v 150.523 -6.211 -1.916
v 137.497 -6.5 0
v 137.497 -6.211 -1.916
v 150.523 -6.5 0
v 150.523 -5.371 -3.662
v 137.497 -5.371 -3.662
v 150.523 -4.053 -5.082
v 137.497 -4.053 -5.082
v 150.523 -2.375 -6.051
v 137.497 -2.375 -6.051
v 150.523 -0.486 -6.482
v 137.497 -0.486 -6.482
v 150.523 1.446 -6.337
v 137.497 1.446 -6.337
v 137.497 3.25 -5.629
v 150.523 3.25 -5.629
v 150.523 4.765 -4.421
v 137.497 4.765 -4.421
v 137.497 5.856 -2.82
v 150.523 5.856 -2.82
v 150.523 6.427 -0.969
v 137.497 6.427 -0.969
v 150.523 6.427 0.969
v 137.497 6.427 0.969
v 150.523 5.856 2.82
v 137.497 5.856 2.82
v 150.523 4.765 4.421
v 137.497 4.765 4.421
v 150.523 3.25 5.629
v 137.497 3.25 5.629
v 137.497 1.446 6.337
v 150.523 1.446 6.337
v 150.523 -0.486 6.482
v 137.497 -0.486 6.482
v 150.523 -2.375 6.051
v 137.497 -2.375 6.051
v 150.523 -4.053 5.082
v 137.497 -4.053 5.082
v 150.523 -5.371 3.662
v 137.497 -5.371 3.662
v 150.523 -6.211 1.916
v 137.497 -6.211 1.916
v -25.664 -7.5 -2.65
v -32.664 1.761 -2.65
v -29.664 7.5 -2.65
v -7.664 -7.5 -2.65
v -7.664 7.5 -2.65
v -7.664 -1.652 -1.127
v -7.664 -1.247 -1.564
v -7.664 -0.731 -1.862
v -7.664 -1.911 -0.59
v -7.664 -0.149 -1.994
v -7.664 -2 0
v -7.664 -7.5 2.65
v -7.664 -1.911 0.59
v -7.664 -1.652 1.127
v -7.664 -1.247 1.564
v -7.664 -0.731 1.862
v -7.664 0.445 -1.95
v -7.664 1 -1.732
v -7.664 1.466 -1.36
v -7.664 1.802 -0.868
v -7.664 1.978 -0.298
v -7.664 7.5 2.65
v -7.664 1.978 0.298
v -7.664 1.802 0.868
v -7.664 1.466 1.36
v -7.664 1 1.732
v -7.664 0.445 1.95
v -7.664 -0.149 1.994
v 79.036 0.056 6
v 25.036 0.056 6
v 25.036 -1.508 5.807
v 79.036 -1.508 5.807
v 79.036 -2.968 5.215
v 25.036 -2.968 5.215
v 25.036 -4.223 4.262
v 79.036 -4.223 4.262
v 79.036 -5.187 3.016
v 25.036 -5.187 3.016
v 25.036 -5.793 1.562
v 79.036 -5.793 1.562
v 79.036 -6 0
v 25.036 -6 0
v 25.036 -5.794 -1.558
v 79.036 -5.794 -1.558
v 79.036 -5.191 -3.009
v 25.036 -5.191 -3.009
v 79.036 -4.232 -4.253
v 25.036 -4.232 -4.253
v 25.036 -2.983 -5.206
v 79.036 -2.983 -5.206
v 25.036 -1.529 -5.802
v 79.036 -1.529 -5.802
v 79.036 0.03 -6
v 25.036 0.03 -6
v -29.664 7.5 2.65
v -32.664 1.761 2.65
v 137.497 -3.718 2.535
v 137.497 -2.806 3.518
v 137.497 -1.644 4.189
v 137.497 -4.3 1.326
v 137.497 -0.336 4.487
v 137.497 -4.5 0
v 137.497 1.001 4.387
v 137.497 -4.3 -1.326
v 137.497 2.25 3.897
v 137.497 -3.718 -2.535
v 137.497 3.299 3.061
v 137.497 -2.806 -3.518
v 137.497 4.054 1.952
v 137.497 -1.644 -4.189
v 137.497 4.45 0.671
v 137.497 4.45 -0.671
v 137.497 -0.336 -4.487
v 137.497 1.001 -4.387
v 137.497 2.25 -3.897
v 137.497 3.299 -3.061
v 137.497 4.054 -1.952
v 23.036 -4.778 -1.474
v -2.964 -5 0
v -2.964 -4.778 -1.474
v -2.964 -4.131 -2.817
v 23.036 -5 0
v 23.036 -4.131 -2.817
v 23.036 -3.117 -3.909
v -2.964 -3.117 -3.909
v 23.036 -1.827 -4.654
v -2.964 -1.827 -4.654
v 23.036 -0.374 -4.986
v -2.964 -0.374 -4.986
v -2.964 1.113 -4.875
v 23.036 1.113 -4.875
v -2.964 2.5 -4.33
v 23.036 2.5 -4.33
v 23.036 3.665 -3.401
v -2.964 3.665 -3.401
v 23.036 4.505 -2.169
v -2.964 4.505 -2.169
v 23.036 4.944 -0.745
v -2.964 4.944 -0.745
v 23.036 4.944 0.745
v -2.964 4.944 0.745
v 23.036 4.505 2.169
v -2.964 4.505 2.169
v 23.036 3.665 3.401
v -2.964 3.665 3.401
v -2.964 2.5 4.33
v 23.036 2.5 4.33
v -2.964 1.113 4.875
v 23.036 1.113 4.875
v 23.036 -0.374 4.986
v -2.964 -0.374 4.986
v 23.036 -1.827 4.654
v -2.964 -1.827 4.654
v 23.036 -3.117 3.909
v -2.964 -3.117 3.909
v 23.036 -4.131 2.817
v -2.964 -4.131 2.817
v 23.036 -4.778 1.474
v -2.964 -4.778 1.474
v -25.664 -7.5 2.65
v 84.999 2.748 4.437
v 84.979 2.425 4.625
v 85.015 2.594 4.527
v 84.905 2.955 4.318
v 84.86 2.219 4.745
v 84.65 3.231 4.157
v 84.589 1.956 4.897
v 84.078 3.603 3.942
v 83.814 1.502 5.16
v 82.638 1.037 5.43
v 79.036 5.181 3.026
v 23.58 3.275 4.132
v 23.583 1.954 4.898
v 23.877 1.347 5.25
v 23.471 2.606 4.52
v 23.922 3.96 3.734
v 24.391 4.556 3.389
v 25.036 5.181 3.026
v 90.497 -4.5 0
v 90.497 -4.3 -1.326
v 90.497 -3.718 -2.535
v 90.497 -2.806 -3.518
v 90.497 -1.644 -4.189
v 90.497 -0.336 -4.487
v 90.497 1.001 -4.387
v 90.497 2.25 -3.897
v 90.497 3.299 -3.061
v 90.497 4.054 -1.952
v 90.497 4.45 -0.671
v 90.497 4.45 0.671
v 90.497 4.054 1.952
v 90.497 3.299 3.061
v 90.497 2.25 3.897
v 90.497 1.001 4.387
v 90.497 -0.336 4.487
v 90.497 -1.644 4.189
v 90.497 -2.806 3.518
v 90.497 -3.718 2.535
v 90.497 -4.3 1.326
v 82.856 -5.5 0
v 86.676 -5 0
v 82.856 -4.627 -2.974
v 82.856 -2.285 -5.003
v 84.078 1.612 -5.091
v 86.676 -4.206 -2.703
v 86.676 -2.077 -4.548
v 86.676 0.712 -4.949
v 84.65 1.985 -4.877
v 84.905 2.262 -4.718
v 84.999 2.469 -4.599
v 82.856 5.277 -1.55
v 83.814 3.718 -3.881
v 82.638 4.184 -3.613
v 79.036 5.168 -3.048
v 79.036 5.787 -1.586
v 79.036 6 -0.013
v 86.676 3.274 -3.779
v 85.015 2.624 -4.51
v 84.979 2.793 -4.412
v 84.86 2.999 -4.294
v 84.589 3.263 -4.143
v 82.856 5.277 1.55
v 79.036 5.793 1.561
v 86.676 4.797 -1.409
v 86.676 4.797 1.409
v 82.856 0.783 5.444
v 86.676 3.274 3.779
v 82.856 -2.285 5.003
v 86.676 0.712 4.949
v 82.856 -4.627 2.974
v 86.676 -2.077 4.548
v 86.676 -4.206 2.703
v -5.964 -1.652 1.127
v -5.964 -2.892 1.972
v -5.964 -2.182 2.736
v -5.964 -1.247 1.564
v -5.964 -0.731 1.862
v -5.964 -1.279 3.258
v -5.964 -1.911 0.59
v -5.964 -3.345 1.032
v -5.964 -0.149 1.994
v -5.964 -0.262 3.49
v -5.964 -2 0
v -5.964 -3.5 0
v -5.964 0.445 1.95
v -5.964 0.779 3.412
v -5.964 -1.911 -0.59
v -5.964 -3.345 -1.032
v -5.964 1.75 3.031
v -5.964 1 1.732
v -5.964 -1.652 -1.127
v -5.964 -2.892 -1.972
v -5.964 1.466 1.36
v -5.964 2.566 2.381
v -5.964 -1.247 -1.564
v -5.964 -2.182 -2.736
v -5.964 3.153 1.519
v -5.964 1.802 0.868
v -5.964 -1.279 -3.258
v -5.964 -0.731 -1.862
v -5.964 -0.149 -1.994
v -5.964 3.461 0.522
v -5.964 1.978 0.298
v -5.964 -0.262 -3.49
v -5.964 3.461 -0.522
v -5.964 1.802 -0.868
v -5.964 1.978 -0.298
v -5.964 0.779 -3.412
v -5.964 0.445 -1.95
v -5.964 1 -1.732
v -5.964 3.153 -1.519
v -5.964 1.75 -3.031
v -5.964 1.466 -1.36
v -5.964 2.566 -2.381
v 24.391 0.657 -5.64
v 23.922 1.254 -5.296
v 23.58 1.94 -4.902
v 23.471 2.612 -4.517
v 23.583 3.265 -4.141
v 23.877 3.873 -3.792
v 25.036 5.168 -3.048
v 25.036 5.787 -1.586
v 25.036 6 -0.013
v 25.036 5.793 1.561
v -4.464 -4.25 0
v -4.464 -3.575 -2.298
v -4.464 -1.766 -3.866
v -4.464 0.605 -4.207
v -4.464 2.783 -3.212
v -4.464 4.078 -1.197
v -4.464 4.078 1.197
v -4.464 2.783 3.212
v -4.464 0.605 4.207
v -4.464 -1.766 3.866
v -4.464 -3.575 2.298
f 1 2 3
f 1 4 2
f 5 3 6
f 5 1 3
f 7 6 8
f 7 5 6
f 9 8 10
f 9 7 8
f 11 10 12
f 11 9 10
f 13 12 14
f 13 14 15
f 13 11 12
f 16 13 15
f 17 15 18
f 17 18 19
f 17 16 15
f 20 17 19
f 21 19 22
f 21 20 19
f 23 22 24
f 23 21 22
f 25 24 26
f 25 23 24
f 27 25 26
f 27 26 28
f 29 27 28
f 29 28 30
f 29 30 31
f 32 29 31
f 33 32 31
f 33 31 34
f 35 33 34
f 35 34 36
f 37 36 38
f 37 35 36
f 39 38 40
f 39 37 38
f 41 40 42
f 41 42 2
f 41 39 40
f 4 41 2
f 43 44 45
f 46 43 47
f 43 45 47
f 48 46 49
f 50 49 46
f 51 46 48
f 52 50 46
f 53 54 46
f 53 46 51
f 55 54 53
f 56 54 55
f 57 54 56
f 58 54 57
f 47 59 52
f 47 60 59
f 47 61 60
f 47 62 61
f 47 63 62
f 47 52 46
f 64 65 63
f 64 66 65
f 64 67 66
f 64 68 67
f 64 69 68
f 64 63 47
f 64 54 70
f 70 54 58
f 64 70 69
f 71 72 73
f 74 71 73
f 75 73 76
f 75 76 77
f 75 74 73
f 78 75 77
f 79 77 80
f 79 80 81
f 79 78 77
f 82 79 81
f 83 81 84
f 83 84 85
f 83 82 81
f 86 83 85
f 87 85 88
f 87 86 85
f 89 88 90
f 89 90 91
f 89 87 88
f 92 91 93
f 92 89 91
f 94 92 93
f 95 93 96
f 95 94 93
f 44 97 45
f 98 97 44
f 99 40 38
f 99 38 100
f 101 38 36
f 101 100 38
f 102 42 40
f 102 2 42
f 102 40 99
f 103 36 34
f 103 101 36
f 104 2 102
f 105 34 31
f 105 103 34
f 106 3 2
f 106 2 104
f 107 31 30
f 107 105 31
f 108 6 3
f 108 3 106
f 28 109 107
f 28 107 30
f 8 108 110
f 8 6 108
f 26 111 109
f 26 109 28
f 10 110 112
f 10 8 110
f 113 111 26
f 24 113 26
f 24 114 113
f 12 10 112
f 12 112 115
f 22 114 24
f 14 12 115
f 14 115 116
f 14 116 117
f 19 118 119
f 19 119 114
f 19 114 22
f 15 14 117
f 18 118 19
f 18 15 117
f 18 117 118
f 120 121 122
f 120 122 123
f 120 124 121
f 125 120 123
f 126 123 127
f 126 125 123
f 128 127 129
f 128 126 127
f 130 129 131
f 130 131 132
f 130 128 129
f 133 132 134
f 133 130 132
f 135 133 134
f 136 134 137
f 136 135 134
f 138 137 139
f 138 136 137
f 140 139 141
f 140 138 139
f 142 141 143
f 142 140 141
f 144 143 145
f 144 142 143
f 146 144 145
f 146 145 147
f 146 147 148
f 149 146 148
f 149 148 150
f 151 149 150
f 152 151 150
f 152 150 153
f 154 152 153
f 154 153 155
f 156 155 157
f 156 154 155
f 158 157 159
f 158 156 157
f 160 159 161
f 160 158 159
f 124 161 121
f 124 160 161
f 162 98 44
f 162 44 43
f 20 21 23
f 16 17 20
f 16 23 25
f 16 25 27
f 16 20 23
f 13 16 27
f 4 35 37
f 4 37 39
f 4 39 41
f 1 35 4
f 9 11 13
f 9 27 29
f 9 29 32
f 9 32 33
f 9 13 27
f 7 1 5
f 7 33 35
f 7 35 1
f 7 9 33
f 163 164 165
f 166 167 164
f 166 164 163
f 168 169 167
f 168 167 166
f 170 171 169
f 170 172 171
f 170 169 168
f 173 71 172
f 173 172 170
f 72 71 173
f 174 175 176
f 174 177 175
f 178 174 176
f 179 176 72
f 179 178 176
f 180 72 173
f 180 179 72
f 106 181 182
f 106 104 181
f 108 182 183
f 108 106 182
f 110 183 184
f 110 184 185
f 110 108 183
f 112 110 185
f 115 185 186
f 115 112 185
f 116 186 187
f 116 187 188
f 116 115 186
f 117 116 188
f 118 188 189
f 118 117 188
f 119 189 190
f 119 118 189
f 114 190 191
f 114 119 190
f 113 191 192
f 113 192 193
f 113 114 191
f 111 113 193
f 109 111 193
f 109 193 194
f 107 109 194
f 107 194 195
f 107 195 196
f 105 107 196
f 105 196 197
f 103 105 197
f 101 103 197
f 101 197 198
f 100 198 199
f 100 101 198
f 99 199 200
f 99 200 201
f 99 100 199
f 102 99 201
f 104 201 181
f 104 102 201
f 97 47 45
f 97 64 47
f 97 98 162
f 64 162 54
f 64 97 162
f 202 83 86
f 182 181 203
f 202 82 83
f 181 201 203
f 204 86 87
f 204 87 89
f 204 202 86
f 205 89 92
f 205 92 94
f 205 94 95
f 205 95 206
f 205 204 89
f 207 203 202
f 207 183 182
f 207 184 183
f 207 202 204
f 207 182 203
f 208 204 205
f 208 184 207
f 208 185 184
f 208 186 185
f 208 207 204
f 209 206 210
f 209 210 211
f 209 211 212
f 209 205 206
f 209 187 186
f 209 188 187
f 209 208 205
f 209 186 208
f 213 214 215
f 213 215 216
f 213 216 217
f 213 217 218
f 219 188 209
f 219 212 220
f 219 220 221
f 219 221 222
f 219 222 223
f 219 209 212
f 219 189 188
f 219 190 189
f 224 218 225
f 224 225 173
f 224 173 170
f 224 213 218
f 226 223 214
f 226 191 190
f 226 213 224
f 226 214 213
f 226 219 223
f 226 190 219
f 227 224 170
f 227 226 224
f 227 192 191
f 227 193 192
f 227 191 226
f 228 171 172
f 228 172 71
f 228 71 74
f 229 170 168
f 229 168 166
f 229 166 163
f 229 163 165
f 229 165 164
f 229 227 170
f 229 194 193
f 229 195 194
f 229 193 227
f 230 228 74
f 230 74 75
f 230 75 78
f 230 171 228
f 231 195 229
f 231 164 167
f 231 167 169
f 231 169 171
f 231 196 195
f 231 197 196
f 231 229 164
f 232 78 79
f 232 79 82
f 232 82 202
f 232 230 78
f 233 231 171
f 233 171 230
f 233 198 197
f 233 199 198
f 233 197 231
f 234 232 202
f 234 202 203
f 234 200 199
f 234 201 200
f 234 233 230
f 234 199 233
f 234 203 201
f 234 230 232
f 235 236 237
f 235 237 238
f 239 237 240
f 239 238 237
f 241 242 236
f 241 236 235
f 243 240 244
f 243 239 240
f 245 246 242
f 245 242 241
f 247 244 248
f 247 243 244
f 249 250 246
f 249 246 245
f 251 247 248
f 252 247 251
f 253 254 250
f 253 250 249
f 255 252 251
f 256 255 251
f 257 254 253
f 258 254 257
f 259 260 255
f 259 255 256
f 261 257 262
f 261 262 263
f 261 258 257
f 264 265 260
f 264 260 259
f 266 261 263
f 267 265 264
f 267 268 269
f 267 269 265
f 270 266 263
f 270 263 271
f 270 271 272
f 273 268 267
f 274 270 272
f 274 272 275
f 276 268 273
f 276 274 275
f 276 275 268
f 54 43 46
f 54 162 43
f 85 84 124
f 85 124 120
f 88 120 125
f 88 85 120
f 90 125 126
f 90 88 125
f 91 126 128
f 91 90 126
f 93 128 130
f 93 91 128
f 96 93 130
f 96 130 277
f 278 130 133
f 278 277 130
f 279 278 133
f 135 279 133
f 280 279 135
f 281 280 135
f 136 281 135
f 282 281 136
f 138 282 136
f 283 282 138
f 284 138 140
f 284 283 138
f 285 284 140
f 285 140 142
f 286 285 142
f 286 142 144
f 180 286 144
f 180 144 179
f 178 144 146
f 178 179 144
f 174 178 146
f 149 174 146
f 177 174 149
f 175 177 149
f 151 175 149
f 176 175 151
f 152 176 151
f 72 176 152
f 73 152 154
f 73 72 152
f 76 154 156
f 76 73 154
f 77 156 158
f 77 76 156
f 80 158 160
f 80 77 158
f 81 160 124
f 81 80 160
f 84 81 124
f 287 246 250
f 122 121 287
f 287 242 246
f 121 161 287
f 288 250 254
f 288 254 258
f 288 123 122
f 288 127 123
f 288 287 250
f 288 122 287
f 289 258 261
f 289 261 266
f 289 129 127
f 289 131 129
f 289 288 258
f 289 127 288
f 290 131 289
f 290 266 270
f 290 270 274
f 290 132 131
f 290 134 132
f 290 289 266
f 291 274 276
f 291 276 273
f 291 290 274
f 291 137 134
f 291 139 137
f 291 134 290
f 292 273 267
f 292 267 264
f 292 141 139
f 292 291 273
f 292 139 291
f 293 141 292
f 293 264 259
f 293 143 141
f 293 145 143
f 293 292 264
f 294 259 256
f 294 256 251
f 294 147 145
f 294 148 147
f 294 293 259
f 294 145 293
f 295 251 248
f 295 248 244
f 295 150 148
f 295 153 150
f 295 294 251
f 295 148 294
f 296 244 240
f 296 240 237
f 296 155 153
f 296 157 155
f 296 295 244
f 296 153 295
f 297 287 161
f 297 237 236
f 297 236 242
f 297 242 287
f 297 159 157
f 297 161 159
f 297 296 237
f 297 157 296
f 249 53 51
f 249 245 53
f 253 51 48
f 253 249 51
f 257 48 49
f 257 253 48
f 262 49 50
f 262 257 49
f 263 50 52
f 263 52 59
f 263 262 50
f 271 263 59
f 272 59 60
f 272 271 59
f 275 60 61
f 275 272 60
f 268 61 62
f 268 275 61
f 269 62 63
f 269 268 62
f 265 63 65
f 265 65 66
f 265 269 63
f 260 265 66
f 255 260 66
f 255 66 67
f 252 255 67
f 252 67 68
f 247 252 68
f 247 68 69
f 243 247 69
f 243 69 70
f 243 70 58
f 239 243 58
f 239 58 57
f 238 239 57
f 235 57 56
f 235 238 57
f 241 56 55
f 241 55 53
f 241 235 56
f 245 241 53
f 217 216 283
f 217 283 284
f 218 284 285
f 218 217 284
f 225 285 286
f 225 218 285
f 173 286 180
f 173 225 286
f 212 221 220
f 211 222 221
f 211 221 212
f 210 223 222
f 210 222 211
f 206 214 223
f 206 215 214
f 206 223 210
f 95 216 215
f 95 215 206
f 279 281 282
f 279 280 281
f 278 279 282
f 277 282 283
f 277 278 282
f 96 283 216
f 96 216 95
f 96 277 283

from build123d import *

# Parameters (mm, degrees)
F0_W     = 1.7
F0_H     = 2
F0_W_2   = 26
F0_H_2   = 5
F0_W_3   = 54
F0_H_3   = 6
F0_W_4   = 47
F0_H_4   = 4.5
F2_DEPTH = 2.65
F4_DEPTH = 97.7


with BuildPart() as f1:
    # F0 (on Top) → F1 (revolve)
    with BuildSketch(Plane.XY):
        with Locations((-6.814198, -1)):
            Rectangle(F0_W, F0_H)
        with Locations((10.035802, -2.5)):
            Rectangle(F0_W_2, F0_H_2)
        Polygon((25.035802, 0), (23.035802, 0), (23.035802, -5), (25.035802, -6), align=None)
        with Locations((52.035802, -3)):
            Rectangle(F0_W_3, F0_H_3)
        Polygon((90.496607, 0), (79.035802, 0), (79.035802, -6), (90.496607, -4.5), align=None)
        with Locations((113.996607, -2.25)):
            Rectangle(F0_W_4, F0_H_4)
        Polygon((150.523409, 0), (137.496607, 0), (137.496607, -4.5), (137.496607, -6.5), (150.523409, -6.5), align=None)
        Polygon((-2.964198, 0), (-5.964198, 0), (-5.964198, -2), (-5.964198, -3.5), (-2.964198, -5), align=None)
    revolve(axis=Axis((44.526573, 0, 0), (1, 0, 0)))

    # F0 (on Top) → F2 (join, symmetric)
    with BuildSketch(Plane.XY):
        Polygon((-7.664198, 7.5), (-29.664198, 7.5), (-32.664198, 1.760973), (-25.664198, -7.5), (-7.664198, -7.5), (-7.664198, -2), (-7.664198, 0), align=None)
    extrude(amount=F2_DEPTH, both=True)

    # F3 (on Right) → F4 (cut)
    with BuildSketch(Plane.YZ):
        Polygon((0.013024, 7.701685), (0.013024, 6.024447), (5.223836, 3.000944), (8.659112, 3.000944), (8.659112, -3.023503), (5.210811, -3.023503), (-0.013024, -6.024447), (0.013024, -7.905965), (11.633459, -7.905965), (11.633459, 7.701685), align=None)
    extrude(amount=F4_DEPTH, mode=Mode.SUBTRACT)


solid = f1.part
